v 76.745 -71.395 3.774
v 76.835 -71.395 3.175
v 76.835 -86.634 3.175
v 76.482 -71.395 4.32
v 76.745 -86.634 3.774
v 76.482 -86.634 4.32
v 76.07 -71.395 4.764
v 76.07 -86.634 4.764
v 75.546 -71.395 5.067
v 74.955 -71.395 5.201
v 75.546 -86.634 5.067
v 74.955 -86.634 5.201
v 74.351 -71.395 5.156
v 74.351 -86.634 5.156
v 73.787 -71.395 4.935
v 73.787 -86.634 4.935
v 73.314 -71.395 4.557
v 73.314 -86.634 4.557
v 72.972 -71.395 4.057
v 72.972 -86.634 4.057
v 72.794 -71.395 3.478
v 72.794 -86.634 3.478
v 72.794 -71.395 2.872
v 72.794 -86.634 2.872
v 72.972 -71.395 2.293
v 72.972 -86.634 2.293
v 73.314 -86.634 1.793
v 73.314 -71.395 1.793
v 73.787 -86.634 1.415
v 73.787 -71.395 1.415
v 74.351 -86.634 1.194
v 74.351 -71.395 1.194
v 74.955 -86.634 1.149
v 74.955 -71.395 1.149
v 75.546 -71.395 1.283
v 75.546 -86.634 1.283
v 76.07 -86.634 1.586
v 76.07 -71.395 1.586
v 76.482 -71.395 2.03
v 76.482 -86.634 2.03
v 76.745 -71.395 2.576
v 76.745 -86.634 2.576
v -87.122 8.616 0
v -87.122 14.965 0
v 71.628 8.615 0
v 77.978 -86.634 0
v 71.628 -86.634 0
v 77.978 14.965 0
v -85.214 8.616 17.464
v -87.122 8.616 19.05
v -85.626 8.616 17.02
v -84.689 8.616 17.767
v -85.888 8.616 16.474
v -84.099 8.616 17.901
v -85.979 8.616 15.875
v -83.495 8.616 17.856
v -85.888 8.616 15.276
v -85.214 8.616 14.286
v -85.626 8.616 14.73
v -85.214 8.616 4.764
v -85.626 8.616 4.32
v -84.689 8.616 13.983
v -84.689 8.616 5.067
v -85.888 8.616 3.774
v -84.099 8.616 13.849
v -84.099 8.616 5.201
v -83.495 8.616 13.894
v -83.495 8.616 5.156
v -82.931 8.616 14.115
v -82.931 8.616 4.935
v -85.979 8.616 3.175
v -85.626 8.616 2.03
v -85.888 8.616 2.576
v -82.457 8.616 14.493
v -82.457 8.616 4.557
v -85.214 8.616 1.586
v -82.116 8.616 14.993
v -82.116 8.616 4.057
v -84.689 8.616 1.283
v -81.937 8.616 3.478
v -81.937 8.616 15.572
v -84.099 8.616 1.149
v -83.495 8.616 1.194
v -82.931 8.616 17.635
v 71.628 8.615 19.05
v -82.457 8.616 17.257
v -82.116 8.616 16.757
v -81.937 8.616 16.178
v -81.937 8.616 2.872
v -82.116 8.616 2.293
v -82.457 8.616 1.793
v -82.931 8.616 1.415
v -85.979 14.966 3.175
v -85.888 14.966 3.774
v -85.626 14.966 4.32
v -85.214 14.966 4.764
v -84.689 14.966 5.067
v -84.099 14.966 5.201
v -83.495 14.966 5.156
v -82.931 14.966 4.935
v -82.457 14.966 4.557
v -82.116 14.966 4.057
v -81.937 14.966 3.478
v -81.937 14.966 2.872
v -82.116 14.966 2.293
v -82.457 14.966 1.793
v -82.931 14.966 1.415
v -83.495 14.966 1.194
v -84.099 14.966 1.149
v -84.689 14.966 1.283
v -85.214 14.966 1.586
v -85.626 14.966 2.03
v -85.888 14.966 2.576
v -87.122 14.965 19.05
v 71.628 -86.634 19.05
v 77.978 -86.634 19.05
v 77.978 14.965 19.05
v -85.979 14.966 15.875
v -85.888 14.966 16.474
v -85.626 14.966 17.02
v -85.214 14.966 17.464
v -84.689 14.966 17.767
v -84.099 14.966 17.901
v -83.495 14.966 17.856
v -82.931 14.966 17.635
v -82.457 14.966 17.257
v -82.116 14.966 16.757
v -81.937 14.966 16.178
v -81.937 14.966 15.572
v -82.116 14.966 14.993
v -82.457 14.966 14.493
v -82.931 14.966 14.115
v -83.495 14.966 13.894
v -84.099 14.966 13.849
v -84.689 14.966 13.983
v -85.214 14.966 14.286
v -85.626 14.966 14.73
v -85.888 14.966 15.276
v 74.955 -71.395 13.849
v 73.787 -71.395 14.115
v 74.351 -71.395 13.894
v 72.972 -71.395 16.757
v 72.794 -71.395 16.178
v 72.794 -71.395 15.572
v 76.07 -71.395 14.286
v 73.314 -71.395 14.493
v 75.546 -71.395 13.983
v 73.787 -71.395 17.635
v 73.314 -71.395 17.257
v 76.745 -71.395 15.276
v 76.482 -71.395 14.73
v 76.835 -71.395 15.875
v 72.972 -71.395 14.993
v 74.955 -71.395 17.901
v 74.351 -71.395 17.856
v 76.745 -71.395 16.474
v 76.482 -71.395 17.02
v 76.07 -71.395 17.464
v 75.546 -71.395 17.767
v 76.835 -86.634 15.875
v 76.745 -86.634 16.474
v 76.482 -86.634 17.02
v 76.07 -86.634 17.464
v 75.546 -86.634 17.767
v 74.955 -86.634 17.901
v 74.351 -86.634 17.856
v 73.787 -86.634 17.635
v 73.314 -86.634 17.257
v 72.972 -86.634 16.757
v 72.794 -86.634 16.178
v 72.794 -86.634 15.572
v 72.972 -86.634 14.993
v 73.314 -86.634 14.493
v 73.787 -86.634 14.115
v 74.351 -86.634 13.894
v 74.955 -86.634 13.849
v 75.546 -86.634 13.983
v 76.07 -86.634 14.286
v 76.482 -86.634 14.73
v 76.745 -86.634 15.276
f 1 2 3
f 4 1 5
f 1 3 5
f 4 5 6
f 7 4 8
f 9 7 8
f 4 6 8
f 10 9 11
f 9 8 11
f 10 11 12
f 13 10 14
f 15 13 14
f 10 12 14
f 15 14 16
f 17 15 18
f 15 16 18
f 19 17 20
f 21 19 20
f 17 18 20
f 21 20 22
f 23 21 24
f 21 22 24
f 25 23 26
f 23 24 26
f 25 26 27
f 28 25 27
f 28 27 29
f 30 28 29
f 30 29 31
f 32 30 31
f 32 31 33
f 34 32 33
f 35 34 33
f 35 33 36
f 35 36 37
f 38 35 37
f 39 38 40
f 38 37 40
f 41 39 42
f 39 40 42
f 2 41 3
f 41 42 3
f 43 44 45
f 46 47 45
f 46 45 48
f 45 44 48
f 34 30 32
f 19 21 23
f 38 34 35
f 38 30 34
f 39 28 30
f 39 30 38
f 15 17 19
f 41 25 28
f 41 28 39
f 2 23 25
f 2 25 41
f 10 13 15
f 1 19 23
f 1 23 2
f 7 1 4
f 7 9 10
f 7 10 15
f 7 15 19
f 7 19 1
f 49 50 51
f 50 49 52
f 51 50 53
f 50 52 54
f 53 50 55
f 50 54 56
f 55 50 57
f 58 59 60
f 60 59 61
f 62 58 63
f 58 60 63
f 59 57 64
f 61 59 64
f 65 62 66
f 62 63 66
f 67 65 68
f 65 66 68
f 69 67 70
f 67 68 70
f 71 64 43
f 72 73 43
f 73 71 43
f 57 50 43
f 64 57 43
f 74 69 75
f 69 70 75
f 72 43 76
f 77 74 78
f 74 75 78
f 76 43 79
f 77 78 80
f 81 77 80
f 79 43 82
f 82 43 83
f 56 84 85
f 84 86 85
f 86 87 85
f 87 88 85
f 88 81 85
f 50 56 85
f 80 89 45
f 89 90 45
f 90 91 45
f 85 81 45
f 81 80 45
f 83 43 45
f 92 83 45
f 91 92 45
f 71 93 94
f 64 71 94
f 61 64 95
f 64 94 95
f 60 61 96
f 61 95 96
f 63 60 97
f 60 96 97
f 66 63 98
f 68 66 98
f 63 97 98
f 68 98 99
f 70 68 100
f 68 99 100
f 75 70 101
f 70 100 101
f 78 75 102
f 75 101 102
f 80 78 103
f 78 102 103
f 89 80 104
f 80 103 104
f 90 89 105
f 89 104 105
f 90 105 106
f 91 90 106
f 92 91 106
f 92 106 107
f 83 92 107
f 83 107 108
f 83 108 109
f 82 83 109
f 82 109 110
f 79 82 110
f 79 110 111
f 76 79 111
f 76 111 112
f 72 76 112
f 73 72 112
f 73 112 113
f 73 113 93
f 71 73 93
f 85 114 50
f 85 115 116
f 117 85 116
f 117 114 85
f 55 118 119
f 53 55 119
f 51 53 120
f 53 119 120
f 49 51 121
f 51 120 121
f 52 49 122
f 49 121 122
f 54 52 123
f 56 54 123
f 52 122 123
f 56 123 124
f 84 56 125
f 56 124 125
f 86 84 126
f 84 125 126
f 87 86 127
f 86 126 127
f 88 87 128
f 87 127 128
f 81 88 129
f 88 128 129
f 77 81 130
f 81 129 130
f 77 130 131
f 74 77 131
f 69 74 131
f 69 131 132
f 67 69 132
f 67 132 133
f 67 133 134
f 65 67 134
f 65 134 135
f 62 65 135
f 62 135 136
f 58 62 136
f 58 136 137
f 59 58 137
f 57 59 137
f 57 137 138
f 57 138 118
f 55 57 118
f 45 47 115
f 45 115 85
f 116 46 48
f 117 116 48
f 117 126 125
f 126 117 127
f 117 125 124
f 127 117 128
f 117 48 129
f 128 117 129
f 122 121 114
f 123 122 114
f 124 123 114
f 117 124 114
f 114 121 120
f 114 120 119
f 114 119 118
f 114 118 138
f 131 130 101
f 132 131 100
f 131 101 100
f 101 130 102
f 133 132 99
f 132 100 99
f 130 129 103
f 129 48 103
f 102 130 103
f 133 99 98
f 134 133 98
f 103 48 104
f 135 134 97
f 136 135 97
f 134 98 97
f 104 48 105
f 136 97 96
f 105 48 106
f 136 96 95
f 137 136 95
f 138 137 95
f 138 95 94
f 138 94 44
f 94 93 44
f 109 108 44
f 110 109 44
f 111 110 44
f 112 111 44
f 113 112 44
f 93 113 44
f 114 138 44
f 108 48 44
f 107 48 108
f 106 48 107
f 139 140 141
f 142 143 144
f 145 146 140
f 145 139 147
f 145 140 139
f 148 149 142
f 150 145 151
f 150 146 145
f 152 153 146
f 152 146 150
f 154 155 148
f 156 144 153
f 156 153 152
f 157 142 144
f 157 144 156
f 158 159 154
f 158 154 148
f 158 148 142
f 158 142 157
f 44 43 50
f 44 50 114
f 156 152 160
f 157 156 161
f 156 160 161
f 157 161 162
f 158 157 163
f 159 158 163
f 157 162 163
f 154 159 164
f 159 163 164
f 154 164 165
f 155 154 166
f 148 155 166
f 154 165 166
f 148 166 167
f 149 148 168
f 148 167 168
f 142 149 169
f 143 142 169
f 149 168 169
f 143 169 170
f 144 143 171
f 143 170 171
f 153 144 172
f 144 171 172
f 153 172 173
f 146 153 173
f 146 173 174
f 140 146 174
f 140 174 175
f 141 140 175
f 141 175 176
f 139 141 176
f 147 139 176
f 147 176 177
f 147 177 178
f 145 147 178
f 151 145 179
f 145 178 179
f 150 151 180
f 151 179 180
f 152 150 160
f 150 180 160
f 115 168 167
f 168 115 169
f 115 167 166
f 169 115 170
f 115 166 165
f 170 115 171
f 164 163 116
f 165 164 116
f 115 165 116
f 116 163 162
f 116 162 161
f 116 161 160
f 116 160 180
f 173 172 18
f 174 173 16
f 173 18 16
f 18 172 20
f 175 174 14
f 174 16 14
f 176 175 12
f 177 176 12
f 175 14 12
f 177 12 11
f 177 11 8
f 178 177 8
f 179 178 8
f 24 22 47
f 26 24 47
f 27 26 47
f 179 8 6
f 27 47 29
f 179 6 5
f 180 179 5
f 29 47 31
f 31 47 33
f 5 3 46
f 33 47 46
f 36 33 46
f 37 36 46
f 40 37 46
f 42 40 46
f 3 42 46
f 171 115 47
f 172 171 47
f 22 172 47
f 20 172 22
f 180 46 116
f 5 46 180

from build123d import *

# Parameters (mm, degrees)
F0_W     = 158.75
F0_H     = 6.35
F0_W_2   = 6.35
F0_H_2   = 95.25
F1_DEPTH = 19.05
F2_R     = 2.032
F3_DEPTH = 15.24
F4_R     = 2.032
F5_DEPTH = 25.4


with BuildPart() as f1:
    # F0 (on Top) → F1 (new body)
    with BuildSketch(Plane.XY):
        with Locations((-7.746776, 11.7905)):
            Rectangle(F0_W, F0_H)
        with Locations((74.803224, 11.7905)):
            Rectangle(F0_W_2, F0_H)
        with Locations((74.803224, -39.0095)):
            Rectangle(F0_W_2, F0_H_2)
    extrude(amount=F1_DEPTH)

    # F2 (on face) → F3 (cut)
    with BuildSketch(Plane.XZ.offset(86.6345)):
        with Locations((74.803224, 15.875)):
            Circle(F2_R)
        with Locations((74.803224, 3.175)):
            Circle(F2_R)
    extrude(amount=-F3_DEPTH, mode=Mode.SUBTRACT)

    # F4 (on face) → F5 (cut)
    with BuildSketch(Plane(origin=(0, 14.9655, 0), x_dir=(-1, 0, 0), z_dir=(0, 1, 0))):
        with Locations((83.946776, 15.875)):
            Circle(F4_R)
        with Locations((83.946776, 3.175)):
            Circle(F4_R)
    extrude(amount=-F5_DEPTH, mode=Mode.SUBTRACT)


solid = f1.part
